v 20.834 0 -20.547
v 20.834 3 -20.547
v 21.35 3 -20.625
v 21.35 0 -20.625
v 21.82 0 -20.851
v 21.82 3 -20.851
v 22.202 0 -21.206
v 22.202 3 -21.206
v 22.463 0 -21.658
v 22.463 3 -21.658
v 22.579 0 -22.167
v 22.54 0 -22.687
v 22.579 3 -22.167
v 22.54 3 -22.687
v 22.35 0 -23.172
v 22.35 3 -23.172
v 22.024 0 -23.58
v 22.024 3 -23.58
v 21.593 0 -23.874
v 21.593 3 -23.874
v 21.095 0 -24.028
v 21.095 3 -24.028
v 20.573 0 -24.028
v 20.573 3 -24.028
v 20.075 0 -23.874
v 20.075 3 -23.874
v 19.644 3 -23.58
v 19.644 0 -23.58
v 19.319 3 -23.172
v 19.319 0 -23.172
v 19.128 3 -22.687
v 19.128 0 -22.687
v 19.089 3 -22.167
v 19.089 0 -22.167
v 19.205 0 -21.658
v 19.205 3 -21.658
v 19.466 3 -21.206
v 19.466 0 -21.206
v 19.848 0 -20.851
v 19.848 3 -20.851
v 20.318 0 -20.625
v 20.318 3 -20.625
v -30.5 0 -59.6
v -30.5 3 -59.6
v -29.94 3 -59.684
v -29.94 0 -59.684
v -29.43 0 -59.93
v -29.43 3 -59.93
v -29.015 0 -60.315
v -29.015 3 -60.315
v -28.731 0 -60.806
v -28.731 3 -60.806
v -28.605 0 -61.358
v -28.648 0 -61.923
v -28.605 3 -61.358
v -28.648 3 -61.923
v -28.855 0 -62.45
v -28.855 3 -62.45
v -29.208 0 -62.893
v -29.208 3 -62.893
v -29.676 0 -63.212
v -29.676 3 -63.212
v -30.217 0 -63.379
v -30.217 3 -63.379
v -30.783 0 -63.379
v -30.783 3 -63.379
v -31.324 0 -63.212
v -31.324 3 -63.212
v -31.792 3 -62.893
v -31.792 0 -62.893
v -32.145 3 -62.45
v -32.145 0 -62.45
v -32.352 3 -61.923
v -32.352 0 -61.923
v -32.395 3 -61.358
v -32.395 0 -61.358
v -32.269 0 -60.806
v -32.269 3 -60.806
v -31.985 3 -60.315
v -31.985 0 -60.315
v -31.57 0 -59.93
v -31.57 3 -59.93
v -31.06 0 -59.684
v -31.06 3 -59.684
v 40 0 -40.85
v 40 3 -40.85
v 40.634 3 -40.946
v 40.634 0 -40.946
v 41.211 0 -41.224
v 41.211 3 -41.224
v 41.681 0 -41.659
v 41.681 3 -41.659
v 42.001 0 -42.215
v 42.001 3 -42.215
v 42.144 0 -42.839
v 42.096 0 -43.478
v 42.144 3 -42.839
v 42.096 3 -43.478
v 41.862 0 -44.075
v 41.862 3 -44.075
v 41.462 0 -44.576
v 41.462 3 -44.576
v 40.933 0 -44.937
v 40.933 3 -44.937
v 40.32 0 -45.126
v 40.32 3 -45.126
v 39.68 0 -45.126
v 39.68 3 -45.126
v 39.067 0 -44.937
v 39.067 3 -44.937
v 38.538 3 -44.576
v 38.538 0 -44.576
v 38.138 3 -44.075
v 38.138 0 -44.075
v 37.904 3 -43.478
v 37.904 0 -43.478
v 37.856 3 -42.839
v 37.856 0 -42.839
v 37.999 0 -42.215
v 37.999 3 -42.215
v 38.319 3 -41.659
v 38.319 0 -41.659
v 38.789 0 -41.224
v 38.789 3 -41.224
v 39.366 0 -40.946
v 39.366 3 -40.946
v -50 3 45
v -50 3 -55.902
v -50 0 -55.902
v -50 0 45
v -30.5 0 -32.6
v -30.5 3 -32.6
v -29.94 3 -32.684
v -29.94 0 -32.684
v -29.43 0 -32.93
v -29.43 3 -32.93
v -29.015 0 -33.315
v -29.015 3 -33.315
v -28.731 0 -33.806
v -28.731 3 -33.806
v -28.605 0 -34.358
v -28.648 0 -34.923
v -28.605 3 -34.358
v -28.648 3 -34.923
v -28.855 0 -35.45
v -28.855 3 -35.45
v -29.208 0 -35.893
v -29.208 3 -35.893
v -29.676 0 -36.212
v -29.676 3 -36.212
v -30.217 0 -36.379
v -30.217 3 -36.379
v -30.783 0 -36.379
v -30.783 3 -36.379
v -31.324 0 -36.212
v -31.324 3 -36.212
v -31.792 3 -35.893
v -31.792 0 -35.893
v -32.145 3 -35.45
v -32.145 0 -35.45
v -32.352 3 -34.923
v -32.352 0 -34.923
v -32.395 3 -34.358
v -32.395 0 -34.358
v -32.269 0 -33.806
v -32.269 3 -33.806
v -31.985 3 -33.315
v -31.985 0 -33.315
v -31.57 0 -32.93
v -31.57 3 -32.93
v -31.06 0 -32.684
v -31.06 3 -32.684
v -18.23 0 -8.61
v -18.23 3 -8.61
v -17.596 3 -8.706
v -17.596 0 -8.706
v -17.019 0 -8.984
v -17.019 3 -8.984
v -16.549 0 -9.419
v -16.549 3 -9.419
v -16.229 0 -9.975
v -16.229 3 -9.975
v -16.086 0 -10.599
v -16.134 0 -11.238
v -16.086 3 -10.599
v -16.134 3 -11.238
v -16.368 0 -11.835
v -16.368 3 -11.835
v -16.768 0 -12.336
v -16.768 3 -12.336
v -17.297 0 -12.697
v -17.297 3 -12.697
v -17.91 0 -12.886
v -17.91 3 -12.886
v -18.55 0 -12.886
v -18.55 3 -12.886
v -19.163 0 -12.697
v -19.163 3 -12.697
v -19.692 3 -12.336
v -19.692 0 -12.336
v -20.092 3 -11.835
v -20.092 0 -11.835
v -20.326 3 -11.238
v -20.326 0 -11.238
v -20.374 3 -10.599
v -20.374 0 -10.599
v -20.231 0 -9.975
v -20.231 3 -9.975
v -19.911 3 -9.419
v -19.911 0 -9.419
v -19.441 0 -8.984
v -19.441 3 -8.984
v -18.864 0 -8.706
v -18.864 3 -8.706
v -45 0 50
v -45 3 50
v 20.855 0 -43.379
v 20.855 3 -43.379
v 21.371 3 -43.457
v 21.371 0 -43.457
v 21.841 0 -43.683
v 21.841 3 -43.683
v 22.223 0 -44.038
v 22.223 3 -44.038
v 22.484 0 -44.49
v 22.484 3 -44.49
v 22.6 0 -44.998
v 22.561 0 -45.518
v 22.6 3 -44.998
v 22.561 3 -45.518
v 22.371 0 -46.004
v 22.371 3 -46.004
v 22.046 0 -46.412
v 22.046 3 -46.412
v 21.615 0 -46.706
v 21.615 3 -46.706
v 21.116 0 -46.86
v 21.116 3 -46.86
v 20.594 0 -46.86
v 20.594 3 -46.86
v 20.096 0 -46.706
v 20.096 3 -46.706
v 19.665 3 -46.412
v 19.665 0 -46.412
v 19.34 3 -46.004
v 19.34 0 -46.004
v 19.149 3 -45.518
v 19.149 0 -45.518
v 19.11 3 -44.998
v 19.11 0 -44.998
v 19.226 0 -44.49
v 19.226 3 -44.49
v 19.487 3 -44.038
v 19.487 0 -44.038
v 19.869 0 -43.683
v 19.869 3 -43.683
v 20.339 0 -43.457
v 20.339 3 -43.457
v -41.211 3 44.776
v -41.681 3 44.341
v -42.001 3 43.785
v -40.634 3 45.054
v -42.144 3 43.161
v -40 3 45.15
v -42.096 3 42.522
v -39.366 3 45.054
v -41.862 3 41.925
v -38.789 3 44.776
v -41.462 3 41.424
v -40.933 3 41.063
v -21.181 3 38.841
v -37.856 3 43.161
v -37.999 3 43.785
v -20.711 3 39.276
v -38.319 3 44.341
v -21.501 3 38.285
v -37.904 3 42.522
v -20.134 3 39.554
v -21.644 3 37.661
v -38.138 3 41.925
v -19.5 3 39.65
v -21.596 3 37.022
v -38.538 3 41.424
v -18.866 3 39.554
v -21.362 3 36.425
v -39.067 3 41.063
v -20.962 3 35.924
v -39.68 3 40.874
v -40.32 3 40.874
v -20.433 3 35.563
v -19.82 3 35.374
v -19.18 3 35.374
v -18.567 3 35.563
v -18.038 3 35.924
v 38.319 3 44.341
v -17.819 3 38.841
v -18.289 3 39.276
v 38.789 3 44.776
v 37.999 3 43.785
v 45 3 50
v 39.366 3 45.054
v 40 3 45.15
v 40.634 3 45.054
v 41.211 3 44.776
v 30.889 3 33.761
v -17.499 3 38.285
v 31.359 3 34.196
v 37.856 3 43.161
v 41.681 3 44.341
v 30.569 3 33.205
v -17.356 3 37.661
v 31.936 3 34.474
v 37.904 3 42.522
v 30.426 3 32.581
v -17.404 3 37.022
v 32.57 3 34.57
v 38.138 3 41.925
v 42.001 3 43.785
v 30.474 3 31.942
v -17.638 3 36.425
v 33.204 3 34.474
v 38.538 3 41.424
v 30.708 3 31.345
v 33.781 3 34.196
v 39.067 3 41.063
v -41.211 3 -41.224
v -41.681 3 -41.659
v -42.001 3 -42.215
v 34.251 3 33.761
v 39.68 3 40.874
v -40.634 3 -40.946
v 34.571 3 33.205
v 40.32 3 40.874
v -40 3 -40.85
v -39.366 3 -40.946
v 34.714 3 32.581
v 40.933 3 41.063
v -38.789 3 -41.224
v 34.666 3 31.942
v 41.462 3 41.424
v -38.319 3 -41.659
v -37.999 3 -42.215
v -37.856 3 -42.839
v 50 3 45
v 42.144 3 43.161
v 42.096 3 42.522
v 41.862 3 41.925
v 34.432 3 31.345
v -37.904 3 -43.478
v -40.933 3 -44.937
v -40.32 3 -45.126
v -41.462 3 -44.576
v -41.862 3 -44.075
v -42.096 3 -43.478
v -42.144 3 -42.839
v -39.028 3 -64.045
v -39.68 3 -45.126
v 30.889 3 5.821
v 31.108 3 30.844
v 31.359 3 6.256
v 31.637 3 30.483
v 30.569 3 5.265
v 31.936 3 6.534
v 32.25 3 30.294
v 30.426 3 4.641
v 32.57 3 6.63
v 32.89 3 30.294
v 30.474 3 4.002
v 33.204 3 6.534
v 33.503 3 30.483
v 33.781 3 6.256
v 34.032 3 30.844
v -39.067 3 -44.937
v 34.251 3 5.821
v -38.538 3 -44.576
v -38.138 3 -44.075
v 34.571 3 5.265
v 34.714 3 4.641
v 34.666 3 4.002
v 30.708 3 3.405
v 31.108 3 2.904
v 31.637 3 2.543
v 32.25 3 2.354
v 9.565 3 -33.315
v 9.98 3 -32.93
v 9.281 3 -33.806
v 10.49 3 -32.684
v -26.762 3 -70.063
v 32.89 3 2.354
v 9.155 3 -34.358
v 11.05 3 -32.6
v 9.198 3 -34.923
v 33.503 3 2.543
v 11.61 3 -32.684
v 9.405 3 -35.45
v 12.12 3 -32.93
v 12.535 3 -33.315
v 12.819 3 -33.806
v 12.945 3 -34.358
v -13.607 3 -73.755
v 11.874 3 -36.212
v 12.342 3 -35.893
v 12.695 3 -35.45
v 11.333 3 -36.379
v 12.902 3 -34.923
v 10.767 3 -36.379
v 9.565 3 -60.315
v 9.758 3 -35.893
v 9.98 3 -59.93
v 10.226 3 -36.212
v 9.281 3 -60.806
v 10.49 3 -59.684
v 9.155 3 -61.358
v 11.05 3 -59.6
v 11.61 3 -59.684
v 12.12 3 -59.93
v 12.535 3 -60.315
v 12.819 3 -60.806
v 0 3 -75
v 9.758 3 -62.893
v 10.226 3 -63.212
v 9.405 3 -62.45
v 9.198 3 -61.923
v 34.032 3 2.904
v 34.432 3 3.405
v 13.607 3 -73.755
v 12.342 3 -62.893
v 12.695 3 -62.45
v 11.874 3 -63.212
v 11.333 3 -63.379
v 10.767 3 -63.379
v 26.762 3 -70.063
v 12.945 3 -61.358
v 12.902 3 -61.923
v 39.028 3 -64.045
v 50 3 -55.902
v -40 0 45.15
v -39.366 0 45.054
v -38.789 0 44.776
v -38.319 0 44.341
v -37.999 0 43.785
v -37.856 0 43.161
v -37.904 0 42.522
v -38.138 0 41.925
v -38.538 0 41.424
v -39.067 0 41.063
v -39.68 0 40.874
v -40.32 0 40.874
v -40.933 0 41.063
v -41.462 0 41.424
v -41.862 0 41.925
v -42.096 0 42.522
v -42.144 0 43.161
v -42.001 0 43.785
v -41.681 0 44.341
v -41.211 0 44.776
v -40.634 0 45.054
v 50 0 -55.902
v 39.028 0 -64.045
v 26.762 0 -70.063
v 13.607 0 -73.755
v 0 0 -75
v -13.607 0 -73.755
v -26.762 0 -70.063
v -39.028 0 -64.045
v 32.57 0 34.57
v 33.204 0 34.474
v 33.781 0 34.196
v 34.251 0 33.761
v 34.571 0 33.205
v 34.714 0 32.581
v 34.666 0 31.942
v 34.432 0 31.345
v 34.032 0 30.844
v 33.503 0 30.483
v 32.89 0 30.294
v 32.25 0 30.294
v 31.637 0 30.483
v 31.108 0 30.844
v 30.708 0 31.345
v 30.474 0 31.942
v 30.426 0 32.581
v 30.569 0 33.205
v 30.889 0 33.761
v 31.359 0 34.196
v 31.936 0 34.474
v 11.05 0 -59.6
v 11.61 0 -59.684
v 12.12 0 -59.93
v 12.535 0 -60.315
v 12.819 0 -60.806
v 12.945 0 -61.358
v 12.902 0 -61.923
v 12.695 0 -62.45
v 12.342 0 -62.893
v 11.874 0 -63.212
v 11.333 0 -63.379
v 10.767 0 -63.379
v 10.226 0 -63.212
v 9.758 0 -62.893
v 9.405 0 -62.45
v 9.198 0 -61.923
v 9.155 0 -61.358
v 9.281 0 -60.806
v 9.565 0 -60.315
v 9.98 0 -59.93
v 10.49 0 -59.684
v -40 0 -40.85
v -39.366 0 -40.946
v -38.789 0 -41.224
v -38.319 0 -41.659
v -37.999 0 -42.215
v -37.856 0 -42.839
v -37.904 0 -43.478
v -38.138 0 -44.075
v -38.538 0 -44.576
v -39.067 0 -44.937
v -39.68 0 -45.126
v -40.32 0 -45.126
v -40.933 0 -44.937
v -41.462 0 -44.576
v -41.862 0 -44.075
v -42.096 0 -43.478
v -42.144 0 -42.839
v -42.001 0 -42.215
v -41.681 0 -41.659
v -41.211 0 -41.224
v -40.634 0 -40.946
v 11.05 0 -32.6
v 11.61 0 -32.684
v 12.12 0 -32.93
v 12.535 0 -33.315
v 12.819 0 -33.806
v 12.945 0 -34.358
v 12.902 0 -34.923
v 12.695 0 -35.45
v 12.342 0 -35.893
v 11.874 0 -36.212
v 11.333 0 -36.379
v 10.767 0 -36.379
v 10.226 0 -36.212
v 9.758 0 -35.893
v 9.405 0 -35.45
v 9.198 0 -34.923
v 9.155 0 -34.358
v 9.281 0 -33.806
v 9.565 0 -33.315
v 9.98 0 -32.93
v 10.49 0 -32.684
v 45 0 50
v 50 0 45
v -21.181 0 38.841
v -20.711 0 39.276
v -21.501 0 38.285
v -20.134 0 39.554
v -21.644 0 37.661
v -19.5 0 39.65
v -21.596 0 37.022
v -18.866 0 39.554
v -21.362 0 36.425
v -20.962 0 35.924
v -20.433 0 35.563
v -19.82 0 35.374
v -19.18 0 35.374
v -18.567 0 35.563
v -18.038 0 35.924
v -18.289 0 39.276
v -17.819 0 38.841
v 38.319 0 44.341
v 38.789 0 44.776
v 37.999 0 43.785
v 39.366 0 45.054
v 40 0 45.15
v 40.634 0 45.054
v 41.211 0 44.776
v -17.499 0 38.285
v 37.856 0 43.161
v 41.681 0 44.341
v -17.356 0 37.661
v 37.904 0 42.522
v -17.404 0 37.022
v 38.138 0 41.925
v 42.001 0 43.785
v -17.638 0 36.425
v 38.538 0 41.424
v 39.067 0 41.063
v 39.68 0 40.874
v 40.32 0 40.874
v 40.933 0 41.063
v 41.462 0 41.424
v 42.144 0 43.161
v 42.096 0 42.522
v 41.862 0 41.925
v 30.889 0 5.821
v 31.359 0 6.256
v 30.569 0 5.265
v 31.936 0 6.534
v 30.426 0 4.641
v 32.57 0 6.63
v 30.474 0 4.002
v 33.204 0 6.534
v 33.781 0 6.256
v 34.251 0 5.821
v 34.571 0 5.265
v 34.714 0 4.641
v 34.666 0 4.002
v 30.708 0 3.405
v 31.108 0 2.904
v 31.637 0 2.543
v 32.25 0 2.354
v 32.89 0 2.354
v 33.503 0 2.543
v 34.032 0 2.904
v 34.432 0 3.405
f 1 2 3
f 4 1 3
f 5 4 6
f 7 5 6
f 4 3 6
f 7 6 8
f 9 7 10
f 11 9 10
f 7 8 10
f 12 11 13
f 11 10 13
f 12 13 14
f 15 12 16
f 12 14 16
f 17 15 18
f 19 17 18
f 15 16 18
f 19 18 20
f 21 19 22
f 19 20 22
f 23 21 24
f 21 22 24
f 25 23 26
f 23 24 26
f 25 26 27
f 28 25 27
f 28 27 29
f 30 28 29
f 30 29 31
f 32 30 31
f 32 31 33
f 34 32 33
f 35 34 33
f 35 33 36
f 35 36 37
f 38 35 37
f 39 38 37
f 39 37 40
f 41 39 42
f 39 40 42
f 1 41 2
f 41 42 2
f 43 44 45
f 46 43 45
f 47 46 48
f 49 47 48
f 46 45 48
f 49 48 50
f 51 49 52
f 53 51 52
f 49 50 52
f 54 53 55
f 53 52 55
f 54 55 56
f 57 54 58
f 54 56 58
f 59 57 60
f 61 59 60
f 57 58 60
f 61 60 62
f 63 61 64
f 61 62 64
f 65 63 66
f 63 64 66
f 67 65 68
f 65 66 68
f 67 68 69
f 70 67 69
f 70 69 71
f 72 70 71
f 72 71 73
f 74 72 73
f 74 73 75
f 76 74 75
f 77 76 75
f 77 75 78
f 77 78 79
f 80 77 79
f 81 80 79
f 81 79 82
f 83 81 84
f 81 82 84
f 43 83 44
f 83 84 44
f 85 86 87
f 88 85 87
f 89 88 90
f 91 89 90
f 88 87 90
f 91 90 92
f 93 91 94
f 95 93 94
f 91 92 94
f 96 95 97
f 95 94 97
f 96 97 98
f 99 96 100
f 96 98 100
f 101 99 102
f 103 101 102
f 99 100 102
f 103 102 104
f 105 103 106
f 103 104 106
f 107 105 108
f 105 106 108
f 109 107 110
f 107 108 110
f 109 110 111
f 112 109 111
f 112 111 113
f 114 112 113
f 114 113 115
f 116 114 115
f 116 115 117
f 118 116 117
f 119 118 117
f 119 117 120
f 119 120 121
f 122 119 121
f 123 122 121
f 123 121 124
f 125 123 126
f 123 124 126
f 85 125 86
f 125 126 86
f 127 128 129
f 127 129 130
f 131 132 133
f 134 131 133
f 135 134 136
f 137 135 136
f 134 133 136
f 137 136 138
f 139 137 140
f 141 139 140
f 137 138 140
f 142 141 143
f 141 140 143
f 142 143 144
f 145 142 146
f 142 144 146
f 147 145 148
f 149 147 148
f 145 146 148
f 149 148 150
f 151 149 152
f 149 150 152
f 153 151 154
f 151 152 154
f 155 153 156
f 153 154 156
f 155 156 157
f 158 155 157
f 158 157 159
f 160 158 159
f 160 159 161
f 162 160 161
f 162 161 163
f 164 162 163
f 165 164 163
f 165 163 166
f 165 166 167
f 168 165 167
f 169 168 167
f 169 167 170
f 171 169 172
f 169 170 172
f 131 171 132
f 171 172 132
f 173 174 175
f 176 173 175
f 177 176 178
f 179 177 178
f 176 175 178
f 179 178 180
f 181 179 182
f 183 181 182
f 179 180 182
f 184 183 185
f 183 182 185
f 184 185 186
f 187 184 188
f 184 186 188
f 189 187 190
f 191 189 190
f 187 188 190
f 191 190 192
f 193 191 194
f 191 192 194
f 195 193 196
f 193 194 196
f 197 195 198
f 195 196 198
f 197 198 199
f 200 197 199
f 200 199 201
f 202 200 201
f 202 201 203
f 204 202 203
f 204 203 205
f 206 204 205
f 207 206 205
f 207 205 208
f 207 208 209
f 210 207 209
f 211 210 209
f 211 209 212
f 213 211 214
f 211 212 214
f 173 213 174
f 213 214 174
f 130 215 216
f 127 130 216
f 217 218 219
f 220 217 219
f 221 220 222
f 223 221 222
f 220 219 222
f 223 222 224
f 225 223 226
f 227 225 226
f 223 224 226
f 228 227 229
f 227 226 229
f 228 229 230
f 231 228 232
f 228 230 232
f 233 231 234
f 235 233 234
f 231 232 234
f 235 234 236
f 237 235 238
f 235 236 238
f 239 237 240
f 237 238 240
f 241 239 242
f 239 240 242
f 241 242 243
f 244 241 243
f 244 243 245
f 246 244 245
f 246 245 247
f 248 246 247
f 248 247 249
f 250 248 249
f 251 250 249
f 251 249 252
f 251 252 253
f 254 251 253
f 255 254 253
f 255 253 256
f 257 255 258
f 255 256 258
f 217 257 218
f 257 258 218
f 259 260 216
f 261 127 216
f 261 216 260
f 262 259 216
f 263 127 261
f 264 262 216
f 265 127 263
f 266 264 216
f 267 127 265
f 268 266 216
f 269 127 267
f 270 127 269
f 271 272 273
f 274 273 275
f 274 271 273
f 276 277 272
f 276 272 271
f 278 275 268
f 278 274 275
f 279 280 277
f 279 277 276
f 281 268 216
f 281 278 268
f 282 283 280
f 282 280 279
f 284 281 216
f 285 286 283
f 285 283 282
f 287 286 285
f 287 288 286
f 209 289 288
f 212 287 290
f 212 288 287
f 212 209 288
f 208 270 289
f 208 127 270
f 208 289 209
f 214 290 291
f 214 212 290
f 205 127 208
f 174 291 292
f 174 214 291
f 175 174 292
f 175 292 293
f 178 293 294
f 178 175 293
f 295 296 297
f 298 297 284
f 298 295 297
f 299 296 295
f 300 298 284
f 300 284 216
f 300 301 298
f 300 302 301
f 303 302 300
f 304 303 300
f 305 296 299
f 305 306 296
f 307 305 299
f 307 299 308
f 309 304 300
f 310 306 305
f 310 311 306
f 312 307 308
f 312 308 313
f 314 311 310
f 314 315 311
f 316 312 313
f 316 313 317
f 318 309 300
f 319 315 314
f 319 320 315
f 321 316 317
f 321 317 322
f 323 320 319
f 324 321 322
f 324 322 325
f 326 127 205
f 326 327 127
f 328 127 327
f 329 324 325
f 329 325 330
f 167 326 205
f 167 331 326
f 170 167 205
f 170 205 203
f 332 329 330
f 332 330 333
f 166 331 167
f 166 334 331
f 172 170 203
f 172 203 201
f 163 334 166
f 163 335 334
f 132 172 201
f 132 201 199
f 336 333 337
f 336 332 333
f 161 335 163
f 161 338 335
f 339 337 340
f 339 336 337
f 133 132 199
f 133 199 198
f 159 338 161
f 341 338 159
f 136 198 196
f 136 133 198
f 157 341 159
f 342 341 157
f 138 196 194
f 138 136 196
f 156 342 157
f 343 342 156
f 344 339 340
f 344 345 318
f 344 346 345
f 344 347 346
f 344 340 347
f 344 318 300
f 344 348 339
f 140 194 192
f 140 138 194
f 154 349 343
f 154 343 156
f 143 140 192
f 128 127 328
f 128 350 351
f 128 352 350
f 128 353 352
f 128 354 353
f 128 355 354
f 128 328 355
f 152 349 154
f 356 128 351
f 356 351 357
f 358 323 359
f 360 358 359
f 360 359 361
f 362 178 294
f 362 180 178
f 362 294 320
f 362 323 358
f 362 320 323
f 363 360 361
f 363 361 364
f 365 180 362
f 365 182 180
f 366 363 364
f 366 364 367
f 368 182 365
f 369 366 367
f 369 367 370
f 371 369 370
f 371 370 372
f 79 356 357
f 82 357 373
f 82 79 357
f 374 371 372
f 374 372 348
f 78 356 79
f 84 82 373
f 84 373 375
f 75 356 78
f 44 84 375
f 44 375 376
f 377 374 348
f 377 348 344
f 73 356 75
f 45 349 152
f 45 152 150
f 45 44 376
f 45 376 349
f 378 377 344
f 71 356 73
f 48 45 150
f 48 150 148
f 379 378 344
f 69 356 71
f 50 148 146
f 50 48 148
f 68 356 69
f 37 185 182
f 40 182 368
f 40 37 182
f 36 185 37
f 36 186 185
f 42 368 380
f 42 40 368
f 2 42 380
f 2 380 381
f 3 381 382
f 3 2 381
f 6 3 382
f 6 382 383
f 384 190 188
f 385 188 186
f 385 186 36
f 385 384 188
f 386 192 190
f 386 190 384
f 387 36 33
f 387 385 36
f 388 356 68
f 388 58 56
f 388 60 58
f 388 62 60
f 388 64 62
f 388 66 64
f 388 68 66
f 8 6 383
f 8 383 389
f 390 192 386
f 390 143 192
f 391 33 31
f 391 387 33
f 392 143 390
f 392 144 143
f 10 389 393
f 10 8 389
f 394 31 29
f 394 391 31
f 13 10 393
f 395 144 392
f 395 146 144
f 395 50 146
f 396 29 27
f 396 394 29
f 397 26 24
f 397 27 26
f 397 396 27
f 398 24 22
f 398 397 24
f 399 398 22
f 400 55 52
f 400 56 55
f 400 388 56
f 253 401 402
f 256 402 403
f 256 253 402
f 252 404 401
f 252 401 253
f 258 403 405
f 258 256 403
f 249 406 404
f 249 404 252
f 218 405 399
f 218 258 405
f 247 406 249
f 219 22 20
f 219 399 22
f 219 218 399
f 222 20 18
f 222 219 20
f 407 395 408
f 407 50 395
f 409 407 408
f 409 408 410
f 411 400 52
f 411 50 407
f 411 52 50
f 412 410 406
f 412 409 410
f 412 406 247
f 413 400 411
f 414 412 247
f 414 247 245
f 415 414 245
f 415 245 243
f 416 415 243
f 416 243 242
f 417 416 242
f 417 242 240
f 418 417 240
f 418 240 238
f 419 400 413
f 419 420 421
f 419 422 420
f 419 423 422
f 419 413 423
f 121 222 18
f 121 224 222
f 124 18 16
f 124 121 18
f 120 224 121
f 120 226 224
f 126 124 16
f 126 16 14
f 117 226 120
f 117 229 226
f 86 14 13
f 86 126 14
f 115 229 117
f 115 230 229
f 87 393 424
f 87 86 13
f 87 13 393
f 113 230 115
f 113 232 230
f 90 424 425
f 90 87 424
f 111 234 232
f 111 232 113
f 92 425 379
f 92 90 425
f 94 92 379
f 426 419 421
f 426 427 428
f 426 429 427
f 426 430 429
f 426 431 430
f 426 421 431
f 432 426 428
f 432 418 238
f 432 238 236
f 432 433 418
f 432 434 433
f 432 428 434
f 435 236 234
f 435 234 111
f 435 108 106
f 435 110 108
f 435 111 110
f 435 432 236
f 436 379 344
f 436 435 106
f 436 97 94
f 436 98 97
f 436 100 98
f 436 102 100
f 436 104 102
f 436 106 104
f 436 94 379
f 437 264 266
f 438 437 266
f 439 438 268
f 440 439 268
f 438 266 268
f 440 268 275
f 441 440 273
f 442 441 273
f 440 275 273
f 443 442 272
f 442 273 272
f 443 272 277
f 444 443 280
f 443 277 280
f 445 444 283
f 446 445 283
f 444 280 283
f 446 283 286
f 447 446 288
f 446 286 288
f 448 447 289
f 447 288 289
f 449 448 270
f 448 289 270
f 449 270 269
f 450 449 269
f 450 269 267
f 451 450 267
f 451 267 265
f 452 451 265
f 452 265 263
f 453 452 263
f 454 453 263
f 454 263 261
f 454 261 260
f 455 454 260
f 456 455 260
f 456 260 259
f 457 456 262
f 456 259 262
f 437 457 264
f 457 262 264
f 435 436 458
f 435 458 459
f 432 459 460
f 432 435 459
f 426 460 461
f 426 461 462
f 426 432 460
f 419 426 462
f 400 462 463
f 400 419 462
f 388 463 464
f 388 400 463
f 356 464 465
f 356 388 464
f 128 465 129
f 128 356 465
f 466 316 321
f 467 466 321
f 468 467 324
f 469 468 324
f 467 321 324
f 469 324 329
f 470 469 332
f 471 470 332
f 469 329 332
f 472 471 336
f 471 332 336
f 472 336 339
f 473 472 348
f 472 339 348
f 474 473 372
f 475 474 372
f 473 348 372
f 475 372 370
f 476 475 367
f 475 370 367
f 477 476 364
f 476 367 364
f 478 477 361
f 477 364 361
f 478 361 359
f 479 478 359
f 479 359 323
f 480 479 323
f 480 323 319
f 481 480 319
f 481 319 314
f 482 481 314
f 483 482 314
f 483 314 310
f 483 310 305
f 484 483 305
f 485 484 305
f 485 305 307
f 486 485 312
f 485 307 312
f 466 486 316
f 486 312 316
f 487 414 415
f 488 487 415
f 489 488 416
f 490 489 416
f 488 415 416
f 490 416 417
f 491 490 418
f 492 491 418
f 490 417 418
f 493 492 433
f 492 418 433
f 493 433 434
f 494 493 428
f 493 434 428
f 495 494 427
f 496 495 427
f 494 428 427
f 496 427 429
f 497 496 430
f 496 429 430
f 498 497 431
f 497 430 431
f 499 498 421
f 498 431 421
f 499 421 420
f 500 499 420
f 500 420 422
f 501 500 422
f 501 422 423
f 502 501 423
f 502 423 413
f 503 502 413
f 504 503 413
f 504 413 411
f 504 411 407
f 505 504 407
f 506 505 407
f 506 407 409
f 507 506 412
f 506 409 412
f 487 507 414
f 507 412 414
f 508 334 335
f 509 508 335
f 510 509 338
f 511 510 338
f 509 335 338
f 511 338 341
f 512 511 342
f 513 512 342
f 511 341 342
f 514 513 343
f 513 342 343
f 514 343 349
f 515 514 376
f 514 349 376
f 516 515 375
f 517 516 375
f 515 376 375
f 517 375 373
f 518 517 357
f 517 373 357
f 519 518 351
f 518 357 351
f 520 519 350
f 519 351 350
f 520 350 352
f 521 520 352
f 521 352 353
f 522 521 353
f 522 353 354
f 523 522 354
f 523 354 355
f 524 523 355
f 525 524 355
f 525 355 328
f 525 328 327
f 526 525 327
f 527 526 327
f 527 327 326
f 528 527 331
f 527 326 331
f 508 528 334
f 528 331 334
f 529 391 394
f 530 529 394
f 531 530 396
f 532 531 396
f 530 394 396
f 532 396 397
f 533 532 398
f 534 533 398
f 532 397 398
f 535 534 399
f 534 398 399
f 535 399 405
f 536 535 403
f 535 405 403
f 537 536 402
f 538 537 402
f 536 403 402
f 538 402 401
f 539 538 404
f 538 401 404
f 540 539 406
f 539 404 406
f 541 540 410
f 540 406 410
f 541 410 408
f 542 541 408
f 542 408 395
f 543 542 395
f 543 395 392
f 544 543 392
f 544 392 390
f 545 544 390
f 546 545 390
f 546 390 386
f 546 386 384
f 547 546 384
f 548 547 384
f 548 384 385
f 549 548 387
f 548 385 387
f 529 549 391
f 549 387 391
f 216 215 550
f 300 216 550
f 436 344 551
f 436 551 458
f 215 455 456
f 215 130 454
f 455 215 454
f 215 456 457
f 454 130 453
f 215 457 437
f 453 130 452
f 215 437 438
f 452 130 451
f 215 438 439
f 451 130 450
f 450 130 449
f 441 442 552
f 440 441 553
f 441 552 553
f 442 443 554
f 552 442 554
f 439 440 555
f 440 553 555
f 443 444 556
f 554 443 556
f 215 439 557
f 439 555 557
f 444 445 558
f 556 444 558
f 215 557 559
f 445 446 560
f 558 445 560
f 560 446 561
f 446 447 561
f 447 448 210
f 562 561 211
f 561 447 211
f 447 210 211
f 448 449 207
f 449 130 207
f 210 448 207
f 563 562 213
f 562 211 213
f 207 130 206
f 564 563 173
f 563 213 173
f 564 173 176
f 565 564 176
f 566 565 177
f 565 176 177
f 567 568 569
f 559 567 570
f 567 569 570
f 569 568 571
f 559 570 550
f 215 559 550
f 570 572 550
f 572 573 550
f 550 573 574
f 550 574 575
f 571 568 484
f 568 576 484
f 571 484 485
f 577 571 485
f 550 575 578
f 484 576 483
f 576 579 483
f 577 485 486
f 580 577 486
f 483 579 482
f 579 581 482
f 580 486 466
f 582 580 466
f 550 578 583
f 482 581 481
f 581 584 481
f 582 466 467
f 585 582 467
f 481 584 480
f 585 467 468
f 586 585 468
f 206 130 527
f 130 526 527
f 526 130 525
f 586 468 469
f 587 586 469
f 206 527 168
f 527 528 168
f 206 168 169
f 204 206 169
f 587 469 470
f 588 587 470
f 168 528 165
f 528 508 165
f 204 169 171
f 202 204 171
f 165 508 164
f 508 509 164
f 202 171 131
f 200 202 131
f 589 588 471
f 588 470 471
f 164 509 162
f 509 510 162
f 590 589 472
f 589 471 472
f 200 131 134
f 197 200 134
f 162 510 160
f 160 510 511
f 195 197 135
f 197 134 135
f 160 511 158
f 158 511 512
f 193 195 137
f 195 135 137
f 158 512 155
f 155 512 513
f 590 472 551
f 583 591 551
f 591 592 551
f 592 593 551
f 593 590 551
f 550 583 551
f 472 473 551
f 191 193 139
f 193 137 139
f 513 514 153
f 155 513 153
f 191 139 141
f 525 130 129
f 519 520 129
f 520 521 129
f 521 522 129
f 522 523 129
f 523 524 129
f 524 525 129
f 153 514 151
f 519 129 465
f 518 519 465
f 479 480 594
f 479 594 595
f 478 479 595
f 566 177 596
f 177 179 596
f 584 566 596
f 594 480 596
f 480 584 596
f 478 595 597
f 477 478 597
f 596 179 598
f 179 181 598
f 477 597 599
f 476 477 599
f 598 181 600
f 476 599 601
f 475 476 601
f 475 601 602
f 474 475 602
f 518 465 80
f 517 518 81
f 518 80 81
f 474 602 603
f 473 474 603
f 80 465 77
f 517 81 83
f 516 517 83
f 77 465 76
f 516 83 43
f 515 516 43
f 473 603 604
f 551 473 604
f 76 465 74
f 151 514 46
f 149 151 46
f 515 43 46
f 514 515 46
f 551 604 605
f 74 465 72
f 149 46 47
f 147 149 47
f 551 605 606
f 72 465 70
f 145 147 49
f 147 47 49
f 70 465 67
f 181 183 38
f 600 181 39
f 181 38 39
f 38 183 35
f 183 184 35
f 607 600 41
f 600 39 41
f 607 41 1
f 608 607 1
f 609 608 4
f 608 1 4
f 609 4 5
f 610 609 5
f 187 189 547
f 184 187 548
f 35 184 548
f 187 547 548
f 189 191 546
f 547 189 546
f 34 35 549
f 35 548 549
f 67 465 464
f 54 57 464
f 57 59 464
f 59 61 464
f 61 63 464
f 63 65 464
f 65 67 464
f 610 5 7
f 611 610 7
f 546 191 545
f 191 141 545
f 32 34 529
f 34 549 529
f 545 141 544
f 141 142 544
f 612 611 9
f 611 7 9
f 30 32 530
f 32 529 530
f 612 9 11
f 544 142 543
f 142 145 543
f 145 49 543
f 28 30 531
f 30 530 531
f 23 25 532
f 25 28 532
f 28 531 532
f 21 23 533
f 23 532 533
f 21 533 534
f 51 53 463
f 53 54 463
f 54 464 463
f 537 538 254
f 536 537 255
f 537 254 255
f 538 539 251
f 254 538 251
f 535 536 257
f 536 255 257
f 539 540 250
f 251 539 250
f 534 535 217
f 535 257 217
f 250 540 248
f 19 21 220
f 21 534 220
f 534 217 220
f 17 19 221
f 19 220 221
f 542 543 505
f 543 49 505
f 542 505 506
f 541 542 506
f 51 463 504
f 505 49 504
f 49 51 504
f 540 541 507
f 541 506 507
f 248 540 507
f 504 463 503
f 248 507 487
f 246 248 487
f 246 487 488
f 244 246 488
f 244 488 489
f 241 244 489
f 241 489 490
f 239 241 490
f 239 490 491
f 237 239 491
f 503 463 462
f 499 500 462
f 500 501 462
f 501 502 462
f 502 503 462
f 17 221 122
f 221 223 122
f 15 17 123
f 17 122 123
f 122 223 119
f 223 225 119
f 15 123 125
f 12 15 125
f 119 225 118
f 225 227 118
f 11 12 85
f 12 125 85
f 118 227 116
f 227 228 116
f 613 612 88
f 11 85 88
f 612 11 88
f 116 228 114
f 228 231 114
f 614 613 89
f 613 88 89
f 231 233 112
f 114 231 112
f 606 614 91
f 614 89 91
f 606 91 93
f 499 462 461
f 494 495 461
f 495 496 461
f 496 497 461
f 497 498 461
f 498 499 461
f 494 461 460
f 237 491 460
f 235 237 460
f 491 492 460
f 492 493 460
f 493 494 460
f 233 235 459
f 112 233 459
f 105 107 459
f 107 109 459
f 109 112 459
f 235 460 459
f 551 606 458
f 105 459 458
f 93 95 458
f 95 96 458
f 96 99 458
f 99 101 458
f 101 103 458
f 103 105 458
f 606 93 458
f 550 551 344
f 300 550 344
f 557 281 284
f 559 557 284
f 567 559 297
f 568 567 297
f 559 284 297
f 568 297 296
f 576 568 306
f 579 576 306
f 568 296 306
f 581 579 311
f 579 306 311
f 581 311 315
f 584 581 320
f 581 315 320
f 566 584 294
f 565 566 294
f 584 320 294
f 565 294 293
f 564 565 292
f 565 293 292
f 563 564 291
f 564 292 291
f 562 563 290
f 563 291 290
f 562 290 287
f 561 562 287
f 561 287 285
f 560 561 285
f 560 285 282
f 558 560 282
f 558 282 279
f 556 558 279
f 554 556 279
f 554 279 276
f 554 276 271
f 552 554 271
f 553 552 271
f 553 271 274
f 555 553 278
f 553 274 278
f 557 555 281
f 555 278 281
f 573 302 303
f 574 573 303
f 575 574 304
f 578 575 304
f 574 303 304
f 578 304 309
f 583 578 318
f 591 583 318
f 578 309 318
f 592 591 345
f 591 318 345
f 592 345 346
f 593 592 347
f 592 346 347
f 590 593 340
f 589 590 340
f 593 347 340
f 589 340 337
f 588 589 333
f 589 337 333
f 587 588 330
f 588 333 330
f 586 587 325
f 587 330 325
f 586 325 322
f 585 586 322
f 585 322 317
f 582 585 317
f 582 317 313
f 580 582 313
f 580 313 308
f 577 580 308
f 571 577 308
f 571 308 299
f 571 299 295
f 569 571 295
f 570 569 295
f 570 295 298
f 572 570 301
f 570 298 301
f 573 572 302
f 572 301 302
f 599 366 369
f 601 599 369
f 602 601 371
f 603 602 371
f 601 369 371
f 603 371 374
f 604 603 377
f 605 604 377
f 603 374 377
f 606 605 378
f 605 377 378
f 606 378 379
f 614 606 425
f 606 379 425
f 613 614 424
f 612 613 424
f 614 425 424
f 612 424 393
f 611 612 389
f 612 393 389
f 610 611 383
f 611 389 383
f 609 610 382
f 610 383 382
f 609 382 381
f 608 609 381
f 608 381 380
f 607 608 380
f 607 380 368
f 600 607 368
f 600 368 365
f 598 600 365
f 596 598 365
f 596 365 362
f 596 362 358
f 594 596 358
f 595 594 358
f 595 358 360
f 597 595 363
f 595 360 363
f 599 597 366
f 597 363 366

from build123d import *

# Parameters (mm, degrees)
SKETCH1_W               = 100
SKETCH1_H               = 100
BOSS_EXTRUDE1_DEPTH     = 3
SKETCH2_R               = 1.75
CUT_EXTRUDE1_DEPTH      = 71.774289117
MIRROR2_COPY_1_SKETCH_R = 1.75
MIRROR2_COPY_1_DEPTH    = 71.774289117
CHAMFER1_SIZE           = 5
SKETCH9_R               = 1.75
BOSS_EXTRUDE2_DEPTH     = 3
CUT_EXTRUDE4_REACH      = 92.189
SKETCH6_R               = 1.75
SKETCH10_R              = 2.15
SKETCH10_R_2            = 1.75
SKETCH10_R_3            = 1.9
SKETCH10_R_4            = 1.5
CUT_EXTRUDE5_DEPTH      = 3
SKETCH13_R              = 1.75
CUT_EXTRUDE6_DEPTH      = 3


with BuildPart() as part:
    # Sketch1 → Boss-Extrude1 (new body)
    with BuildSketch(Plane(origin=(0, 0, 0), x_dir=(1, 0, 0), z_dir=(0, 1, 0))):
        Rectangle(SKETCH1_W, SKETCH1_H)
    extrude(amount=BOSS_EXTRUDE1_DEPTH)

    # Sketch2 → Cut-Extrude1 (cut, through all)
    with BuildSketch(Plane(origin=(0, 3, 0), x_dir=(1, 0, 0), z_dir=(0, 1, 0))):
        with Locations(Location((-40, 43, 0), (0, 0, 270))):
            Circle(SKETCH2_R)
    cut_extrude1 = extrude(amount=-CUT_EXTRUDE1_DEPTH, mode=Mode.SUBTRACT)

    # Mirror1: Cut-Extrude1 across plane
    add(cut_extrude1.mirror(Plane(origin=(0, 0, 0), x_dir=(0, 0, 1), z_dir=(1, 0, 0))), mode=Mode.SUBTRACT)

    # Mirror2: Cut-Extrude1 across plane
    add(cut_extrude1.mirror(Plane.XY), mode=Mode.SUBTRACT)

    # Mirror2 copy 1 sketch → Mirror2 copy 1 (cut, through all)
    with BuildSketch(Plane(origin=(0, 3, 0), x_dir=(-1, 0, 0), z_dir=(0, 1, 0))):
        with Locations(Location((-40, 43, 0), (0, 0, 270))):
            Circle(MIRROR2_COPY_1_SKETCH_R)
    extrude(amount=-MIRROR2_COPY_1_DEPTH, mode=Mode.SUBTRACT)

    # Chamfer1
    chamfer1_edges = [part.edges().sort_by_distance(p)[0] for p in [
        (-50, 1.5, -50),
        (50, 1.5, -50),
        (50, 1.5, 50),
        (-50, 1.5, 50),
    ]]
    chamfer(chamfer1_edges, length=CHAMFER1_SIZE)

    # Sketch9 → Boss-Extrude2 (add)
    with BuildSketch(Plane(origin=(0, 3, 0), x_dir=(1, 0, 0), z_dir=(0, 1, 0))):
        with BuildLine():
            Line((45, 50), (50, 45))
            Line((50, 45), (50, 55.901699437))
            ThreePointArc((50, 55.901699437), (0, 75), (-50, 55.901699437))
            Line((-50, 55.901699437), (-50, 45))
            Line((-50, 45), (-45, 50))
            Line((-45, 50), (45, 50))
        make_face()
        with Locations(Location((-30.5, 61.5, 0), (0, 0, 270))):
            Circle(SKETCH9_R, mode=Mode.SUBTRACT)
    extrude(amount=-BOSS_EXTRUDE2_DEPTH)

    # Sketch6 → Cut-Extrude4 (cut, up to next)
    with BuildSketch(Plane(origin=(0, 3, 0), x_dir=(1, 0, 0), z_dir=(0, 1, 0)), mode=Mode.PRIVATE) as cut_extrude4_sk1:
        with Locations(Location((-18.23, 10.76, 0), (0, 0, 270))):
            Circle(SKETCH6_R)
    cut_extrude4_tool1 = extrude(cut_extrude4_sk1.sketch, amount=-CUT_EXTRUDE4_REACH, mode=Mode.PRIVATE) & part.part
    # Sketch6 → Cut-Extrude4 (cut, up to next)
    with BuildSketch(Plane(origin=(0, 3, 0), x_dir=(1, 0, 0), z_dir=(0, 1, 0)), mode=Mode.PRIVATE) as cut_extrude4_sk2:
        with Locations(Location((-19.5, -37.5, 0), (0, 0, 270))):
            Circle(SKETCH6_R)
    cut_extrude4_tool2 = extrude(cut_extrude4_sk2.sketch, amount=-CUT_EXTRUDE4_REACH, mode=Mode.PRIVATE) & part.part
    # Sketch6 → Cut-Extrude4 (cut, up to next)
    with BuildSketch(Plane(origin=(0, 3, 0), x_dir=(1, 0, 0), z_dir=(0, 1, 0)), mode=Mode.PRIVATE) as cut_extrude4_sk3:
        with Locations(Location((32.57, -32.42, 0), (0, 0, 270))):
            Circle(SKETCH6_R)
    cut_extrude4_tool3 = extrude(cut_extrude4_sk3.sketch, amount=-CUT_EXTRUDE4_REACH, mode=Mode.PRIVATE) & part.part
    # Sketch6 → Cut-Extrude4 (cut, up to next)
    with BuildSketch(Plane(origin=(0, 3, 0), x_dir=(1, 0, 0), z_dir=(0, 1, 0)), mode=Mode.PRIVATE) as cut_extrude4_sk4:
        with Locations(Location((32.57, -4.48, 0), (0, 0, 270))):
            Circle(SKETCH6_R)
    cut_extrude4_tool4 = extrude(cut_extrude4_sk4.sketch, amount=-CUT_EXTRUDE4_REACH, mode=Mode.PRIVATE) & part.part
    add(cut_extrude4_tool1.solids().sort_by_distance((-18.23, 3, -10.76))[0], mode=Mode.SUBTRACT)
    add(cut_extrude4_tool2.solids().sort_by_distance((-19.5, 3, 37.5))[0], mode=Mode.SUBTRACT)
    add(cut_extrude4_tool3.solids().sort_by_distance((32.57, 3, 32.42))[0], mode=Mode.SUBTRACT)
    add(cut_extrude4_tool4.solids().sort_by_distance((32.57, 3, 4.48))[0], mode=Mode.SUBTRACT)

    # Sketch10 → Cut-Extrude5 (cut)
    # profile 1 of 26: a face of its own
    with BuildSketch(Plane(origin=(0, 3, 0), x_dir=(1, 0, 0), z_dir=(0, 1, 0))):
        with Locations(Location((-40, 43, 0), (0, 0, 270))):
            Circle(SKETCH10_R)
        with Locations((-40, 43)):
            Circle(SKETCH10_R_2, mode=Mode.SUBTRACT)
    # profile 2 of 26: a face of its own
    with BuildSketch(Plane(origin=(0, 3, 0), x_dir=(1, 0, 0), z_dir=(0, 1, 0))):
        with Locations((-40, 43)):
            Circle(SKETCH10_R_2)
    # profile 3 of 26: a face of its own
    with BuildSketch(Plane(origin=(0, 3, 0), x_dir=(1, 0, 0), z_dir=(0, 1, 0))):
        with Locations(Location((-30.5, 61.5, 0), (0, 0, 270))):
            Circle(SKETCH10_R_3)
        with Locations((-30.5, 61.5)):
            Circle(SKETCH10_R_2, mode=Mode.SUBTRACT)
    # profile 4 of 26: a face of its own
    with BuildSketch(Plane(origin=(0, 3, 0), x_dir=(1, 0, 0), z_dir=(0, 1, 0))):
        with Locations((-30.5, 61.5)):
            Circle(SKETCH10_R_2)
        with Locations((-30.5, 61.5)):
            Circle(SKETCH10_R_4, mode=Mode.SUBTRACT)
    # profile 5 of 26: a face of its own
    with BuildSketch(Plane(origin=(0, 3, 0), x_dir=(1, 0, 0), z_dir=(0, 1, 0))):
        with Locations((-30.5, 61.5)):
            Circle(SKETCH10_R_4)
    # profile 6 of 26: a face of its own
    with BuildSketch(Plane(origin=(0, 3, 0), x_dir=(1, 0, 0), z_dir=(0, 1, 0))):
        with Locations(Location((-30.5, 34.5, 0), (0, 0, 270))):
            Circle(SKETCH10_R_3)
        with Locations((-30.5, 34.5)):
            Circle(SKETCH10_R_4, mode=Mode.SUBTRACT)
    # profile 7 of 26: a face of its own
    with BuildSketch(Plane(origin=(0, 3, 0), x_dir=(1, 0, 0), z_dir=(0, 1, 0))):
        with Locations((-30.5, 34.5)):
            Circle(SKETCH10_R_4)
    # profile 8 of 26: a face of its own
    with BuildSketch(Plane(origin=(0, 3, 0), x_dir=(1, 0, 0), z_dir=(0, 1, 0))):
        with Locations(Location((-18.23, 10.76, 0), (0, 0, 270))):
            Circle(SKETCH10_R)
        with Locations((-18.23, 10.76)):
            Circle(SKETCH10_R_2, mode=Mode.SUBTRACT)
    # profile 9 of 26: a face of its own
    with BuildSketch(Plane(origin=(0, 3, 0), x_dir=(1, 0, 0), z_dir=(0, 1, 0))):
        with Locations((-18.23, 10.76)):
            Circle(SKETCH10_R_2)
    # profile 10 of 26: a face of its own
    with BuildSketch(Plane(origin=(0, 3, 0), x_dir=(1, 0, 0), z_dir=(0, 1, 0))):
        with Locations(Location((-19.5, -37.5, 0), (0, 0, 270))):
            Circle(SKETCH10_R)
        with Locations((-19.5, -37.5)):
            Circle(SKETCH10_R_2, mode=Mode.SUBTRACT)
    # profile 11 of 26: a face of its own
    with BuildSketch(Plane(origin=(0, 3, 0), x_dir=(1, 0, 0), z_dir=(0, 1, 0))):
        with Locations((-19.5, -37.5)):
            Circle(SKETCH10_R_2)
    # profile 12 of 26: a face of its own
    with BuildSketch(Plane(origin=(0, 3, 0), x_dir=(1, 0, 0), z_dir=(0, 1, 0))):
        with Locations(Location((-40, -43, 0), (0, 0, 270))):
            Circle(SKETCH10_R)
        with Locations((-40, -43)):
            Circle(SKETCH10_R_2, mode=Mode.SUBTRACT)
    # profile 13 of 26: a face of its own
    with BuildSketch(Plane(origin=(0, 3, 0), x_dir=(1, 0, 0), z_dir=(0, 1, 0))):
        with Locations((-40, -43)):
            Circle(SKETCH10_R_2)
    # profile 14 of 26: a face of its own
    with BuildSketch(Plane(origin=(0, 3, 0), x_dir=(1, 0, 0), z_dir=(0, 1, 0))):
        with Locations(Location((40, -43, 0), (0, 0, 270))):
            Circle(SKETCH10_R)
        with Locations((40, -43)):
            Circle(SKETCH10_R_2, mode=Mode.SUBTRACT)
    # profile 15 of 26: a face of its own
    with BuildSketch(Plane(origin=(0, 3, 0), x_dir=(1, 0, 0), z_dir=(0, 1, 0))):
        with Locations((40, -43)):
            Circle(SKETCH10_R_2)
    # profile 16 of 26: a face of its own
    with BuildSketch(Plane(origin=(0, 3, 0), x_dir=(1, 0, 0), z_dir=(0, 1, 0))):
        with Locations(Location((32.57, -32.42, 0), (0, 0, 270))):
            Circle(SKETCH10_R)
        with Locations((32.57, -32.42)):
            Circle(SKETCH10_R_2, mode=Mode.SUBTRACT)
    # profile 17 of 26: a face of its own
    with BuildSketch(Plane(origin=(0, 3, 0), x_dir=(1, 0, 0), z_dir=(0, 1, 0))):
        with Locations((32.57, -32.42)):
            Circle(SKETCH10_R_2)
    # profile 18 of 26: a face of its own
    with BuildSketch(Plane(origin=(0, 3, 0), x_dir=(1, 0, 0), z_dir=(0, 1, 0))):
        with Locations(Location((32.57, -4.48, 0), (0, 0, 270))):
            Circle(SKETCH10_R)
        with Locations((32.57, -4.48)):
            Circle(SKETCH10_R_2, mode=Mode.SUBTRACT)
    # profile 19 of 26: a face of its own
    with BuildSketch(Plane(origin=(0, 3, 0), x_dir=(1, 0, 0), z_dir=(0, 1, 0))):
        with Locations((32.57, -4.48)):
            Circle(SKETCH10_R_2)
    # profile 20 of 26: a face of its own
    with BuildSketch(Plane(origin=(0, 3, 0), x_dir=(1, 0, 0), z_dir=(0, 1, 0))):
        with Locations(Location((40, 43, 0), (0, 0, 270))):
            Circle(SKETCH10_R)
        with Locations((40, 43)):
            Circle(SKETCH10_R_2, mode=Mode.SUBTRACT)
    # profile 21 of 26: a face of its own
    with BuildSketch(Plane(origin=(0, 3, 0), x_dir=(1, 0, 0), z_dir=(0, 1, 0))):
        with Locations((40, 43)):
            Circle(SKETCH10_R_2)
    # profile 22 of 26: a face of its own
    with BuildSketch(Plane(origin=(0, 3, 0), x_dir=(1, 0, 0), z_dir=(0, 1, 0))):
        with Locations(Location((11.05, 34.5, 0), (0, 0, 270))):
            Circle(SKETCH10_R_3)
        with Locations((11.05, 34.5)):
            Circle(SKETCH10_R_4, mode=Mode.SUBTRACT)
    # profile 23 of 26: a face of its own
    with BuildSketch(Plane(origin=(0, 3, 0), x_dir=(1, 0, 0), z_dir=(0, 1, 0))):
        with Locations((11.05, 34.5)):
            Circle(SKETCH10_R_4)
    # profile 24 of 26: a face of its own
    with BuildSketch(Plane(origin=(0, 3, 0), x_dir=(1, 0, 0), z_dir=(0, 1, 0))):
        with Locations(Location((11.05, 61.5, 0), (0, 0, 270))):
            Circle(SKETCH10_R_3)
        with Locations((11.05, 61.5)):
            Circle(SKETCH10_R_2, mode=Mode.SUBTRACT)
    # profile 25 of 26: a face of its own
    with BuildSketch(Plane(origin=(0, 3, 0), x_dir=(1, 0, 0), z_dir=(0, 1, 0))):
        with Locations((11.05, 61.5)):
            Circle(SKETCH10_R_2)
        with Locations((11.05, 61.5)):
            Circle(SKETCH10_R_4, mode=Mode.SUBTRACT)
    # profile 26 of 26: a face of its own
    with BuildSketch(Plane(origin=(0, 3, 0), x_dir=(1, 0, 0), z_dir=(0, 1, 0))):
        with Locations((11.05, 61.5)):
            Circle(SKETCH10_R_4)
    extrude(amount=-CUT_EXTRUDE5_DEPTH, mode=Mode.SUBTRACT)

    # Sketch13 → Cut-Extrude6 (cut)
    with BuildSketch(Plane(origin=(0, 3, 0), x_dir=(1, 0, 0), z_dir=(0, 1, 0))):
        with Locations(Location((20.855220052, 45.129061124, 0), (0, 0, 270))):
            Circle(SKETCH13_R)
        with Locations(Location((20.834109359, 22.297361761, 0), (0, 0, 270))):
            Circle(SKETCH13_R)
    extrude(amount=-CUT_EXTRUDE6_DEPTH, mode=Mode.SUBTRACT)


solid = part.part
